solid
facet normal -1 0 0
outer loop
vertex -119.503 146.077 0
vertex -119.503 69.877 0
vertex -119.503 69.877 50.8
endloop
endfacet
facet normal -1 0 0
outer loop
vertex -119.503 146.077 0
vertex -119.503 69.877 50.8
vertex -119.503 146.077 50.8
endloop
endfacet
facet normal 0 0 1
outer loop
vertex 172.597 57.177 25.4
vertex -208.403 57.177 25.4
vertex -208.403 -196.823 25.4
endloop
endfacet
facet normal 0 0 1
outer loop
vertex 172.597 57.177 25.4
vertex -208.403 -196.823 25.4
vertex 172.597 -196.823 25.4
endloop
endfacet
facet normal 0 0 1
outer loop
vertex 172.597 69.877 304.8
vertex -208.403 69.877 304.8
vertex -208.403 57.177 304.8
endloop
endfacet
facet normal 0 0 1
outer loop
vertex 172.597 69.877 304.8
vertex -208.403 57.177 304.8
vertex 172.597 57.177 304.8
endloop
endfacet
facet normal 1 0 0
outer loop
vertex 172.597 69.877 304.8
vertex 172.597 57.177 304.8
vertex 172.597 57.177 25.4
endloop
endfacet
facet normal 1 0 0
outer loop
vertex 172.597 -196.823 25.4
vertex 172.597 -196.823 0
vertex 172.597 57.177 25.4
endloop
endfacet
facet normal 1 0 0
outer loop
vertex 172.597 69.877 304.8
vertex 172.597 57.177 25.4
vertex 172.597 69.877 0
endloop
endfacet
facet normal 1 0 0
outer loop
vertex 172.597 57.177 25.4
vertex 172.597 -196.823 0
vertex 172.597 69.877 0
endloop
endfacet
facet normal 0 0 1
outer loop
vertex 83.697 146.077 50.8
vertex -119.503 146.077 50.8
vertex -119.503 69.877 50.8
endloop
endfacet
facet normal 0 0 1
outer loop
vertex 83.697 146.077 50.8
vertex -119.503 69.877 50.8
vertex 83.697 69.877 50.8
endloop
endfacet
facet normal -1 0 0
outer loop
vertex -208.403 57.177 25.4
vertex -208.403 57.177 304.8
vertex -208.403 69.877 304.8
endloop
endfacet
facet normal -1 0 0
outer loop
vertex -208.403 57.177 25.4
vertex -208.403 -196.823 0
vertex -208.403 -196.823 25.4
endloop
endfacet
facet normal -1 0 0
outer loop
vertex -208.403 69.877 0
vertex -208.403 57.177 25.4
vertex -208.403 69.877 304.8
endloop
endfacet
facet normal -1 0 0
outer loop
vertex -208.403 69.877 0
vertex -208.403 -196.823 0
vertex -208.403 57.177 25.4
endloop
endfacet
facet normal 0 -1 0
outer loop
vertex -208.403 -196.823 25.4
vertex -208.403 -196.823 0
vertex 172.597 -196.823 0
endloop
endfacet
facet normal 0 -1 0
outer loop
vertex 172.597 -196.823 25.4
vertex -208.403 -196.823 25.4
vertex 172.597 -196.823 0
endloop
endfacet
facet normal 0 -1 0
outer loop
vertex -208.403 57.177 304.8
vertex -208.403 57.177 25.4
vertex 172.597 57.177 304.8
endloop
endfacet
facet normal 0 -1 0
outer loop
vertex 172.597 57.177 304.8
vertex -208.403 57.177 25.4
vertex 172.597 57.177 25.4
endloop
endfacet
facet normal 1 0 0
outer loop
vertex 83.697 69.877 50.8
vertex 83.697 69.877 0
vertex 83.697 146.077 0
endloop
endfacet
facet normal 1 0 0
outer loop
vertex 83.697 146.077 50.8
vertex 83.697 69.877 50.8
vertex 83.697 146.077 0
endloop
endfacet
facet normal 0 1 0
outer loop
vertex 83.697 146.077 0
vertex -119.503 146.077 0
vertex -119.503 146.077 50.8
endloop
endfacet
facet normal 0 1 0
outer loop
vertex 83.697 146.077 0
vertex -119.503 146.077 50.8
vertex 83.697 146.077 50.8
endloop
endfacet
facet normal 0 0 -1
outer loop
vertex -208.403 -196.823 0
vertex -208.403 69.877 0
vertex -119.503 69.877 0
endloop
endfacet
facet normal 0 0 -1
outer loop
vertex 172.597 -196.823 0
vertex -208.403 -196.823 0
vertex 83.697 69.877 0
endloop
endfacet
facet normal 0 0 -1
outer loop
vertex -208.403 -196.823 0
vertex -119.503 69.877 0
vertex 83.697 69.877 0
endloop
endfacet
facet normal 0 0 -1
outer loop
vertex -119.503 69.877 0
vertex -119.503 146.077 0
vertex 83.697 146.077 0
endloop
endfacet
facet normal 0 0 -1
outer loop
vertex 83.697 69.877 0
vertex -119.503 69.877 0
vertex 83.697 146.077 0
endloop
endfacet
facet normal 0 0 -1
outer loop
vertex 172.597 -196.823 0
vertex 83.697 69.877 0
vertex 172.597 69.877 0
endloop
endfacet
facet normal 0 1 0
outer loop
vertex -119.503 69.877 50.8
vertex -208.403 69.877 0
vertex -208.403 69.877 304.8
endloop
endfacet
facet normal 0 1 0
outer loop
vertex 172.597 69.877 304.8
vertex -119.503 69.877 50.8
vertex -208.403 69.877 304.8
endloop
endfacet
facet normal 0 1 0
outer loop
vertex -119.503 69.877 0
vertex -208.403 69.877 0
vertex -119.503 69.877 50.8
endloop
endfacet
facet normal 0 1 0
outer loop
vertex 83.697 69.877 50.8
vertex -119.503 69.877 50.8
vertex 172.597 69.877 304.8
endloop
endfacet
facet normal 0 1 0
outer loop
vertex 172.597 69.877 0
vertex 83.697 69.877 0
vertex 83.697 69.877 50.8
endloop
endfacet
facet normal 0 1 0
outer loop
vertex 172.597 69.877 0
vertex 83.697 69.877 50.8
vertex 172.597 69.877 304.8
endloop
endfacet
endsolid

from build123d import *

# Parameters (mm, degrees)
F1_DEPTH = 25.4
F2_W     = 381
F2_H     = 12.7
F4_DEPTH = 304.8
F3_W     = 203.2
F3_H     = 76.2
F5_DEPTH = 50.8


with BuildPart() as f1:
    # F0 (on Top) → F1 (new body)
    with BuildSketch(Plane.XY):
        Polygon((-208.403401, 57.177154), (-208.403401, -196.822846), (172.596599, -196.822846), (172.596599, 57.177154), (83.696599, 57.177154), (-119.503401, 57.177154), align=None)
    extrude(amount=F1_DEPTH)

    # F2 (on Top) → F4 (join)
    with BuildSketch(Plane.XY):
        with Locations((-17.903401, 63.527154)):
            Rectangle(F2_W, F2_H)
    extrude(amount=F4_DEPTH)

    # F3 (on Top) → F5 (join)
    with BuildSketch(Plane.XY):
        with Locations((-17.903401, 107.977154)):
            Rectangle(F3_W, F3_H)
    extrude(amount=F5_DEPTH)


solid = f1.part
